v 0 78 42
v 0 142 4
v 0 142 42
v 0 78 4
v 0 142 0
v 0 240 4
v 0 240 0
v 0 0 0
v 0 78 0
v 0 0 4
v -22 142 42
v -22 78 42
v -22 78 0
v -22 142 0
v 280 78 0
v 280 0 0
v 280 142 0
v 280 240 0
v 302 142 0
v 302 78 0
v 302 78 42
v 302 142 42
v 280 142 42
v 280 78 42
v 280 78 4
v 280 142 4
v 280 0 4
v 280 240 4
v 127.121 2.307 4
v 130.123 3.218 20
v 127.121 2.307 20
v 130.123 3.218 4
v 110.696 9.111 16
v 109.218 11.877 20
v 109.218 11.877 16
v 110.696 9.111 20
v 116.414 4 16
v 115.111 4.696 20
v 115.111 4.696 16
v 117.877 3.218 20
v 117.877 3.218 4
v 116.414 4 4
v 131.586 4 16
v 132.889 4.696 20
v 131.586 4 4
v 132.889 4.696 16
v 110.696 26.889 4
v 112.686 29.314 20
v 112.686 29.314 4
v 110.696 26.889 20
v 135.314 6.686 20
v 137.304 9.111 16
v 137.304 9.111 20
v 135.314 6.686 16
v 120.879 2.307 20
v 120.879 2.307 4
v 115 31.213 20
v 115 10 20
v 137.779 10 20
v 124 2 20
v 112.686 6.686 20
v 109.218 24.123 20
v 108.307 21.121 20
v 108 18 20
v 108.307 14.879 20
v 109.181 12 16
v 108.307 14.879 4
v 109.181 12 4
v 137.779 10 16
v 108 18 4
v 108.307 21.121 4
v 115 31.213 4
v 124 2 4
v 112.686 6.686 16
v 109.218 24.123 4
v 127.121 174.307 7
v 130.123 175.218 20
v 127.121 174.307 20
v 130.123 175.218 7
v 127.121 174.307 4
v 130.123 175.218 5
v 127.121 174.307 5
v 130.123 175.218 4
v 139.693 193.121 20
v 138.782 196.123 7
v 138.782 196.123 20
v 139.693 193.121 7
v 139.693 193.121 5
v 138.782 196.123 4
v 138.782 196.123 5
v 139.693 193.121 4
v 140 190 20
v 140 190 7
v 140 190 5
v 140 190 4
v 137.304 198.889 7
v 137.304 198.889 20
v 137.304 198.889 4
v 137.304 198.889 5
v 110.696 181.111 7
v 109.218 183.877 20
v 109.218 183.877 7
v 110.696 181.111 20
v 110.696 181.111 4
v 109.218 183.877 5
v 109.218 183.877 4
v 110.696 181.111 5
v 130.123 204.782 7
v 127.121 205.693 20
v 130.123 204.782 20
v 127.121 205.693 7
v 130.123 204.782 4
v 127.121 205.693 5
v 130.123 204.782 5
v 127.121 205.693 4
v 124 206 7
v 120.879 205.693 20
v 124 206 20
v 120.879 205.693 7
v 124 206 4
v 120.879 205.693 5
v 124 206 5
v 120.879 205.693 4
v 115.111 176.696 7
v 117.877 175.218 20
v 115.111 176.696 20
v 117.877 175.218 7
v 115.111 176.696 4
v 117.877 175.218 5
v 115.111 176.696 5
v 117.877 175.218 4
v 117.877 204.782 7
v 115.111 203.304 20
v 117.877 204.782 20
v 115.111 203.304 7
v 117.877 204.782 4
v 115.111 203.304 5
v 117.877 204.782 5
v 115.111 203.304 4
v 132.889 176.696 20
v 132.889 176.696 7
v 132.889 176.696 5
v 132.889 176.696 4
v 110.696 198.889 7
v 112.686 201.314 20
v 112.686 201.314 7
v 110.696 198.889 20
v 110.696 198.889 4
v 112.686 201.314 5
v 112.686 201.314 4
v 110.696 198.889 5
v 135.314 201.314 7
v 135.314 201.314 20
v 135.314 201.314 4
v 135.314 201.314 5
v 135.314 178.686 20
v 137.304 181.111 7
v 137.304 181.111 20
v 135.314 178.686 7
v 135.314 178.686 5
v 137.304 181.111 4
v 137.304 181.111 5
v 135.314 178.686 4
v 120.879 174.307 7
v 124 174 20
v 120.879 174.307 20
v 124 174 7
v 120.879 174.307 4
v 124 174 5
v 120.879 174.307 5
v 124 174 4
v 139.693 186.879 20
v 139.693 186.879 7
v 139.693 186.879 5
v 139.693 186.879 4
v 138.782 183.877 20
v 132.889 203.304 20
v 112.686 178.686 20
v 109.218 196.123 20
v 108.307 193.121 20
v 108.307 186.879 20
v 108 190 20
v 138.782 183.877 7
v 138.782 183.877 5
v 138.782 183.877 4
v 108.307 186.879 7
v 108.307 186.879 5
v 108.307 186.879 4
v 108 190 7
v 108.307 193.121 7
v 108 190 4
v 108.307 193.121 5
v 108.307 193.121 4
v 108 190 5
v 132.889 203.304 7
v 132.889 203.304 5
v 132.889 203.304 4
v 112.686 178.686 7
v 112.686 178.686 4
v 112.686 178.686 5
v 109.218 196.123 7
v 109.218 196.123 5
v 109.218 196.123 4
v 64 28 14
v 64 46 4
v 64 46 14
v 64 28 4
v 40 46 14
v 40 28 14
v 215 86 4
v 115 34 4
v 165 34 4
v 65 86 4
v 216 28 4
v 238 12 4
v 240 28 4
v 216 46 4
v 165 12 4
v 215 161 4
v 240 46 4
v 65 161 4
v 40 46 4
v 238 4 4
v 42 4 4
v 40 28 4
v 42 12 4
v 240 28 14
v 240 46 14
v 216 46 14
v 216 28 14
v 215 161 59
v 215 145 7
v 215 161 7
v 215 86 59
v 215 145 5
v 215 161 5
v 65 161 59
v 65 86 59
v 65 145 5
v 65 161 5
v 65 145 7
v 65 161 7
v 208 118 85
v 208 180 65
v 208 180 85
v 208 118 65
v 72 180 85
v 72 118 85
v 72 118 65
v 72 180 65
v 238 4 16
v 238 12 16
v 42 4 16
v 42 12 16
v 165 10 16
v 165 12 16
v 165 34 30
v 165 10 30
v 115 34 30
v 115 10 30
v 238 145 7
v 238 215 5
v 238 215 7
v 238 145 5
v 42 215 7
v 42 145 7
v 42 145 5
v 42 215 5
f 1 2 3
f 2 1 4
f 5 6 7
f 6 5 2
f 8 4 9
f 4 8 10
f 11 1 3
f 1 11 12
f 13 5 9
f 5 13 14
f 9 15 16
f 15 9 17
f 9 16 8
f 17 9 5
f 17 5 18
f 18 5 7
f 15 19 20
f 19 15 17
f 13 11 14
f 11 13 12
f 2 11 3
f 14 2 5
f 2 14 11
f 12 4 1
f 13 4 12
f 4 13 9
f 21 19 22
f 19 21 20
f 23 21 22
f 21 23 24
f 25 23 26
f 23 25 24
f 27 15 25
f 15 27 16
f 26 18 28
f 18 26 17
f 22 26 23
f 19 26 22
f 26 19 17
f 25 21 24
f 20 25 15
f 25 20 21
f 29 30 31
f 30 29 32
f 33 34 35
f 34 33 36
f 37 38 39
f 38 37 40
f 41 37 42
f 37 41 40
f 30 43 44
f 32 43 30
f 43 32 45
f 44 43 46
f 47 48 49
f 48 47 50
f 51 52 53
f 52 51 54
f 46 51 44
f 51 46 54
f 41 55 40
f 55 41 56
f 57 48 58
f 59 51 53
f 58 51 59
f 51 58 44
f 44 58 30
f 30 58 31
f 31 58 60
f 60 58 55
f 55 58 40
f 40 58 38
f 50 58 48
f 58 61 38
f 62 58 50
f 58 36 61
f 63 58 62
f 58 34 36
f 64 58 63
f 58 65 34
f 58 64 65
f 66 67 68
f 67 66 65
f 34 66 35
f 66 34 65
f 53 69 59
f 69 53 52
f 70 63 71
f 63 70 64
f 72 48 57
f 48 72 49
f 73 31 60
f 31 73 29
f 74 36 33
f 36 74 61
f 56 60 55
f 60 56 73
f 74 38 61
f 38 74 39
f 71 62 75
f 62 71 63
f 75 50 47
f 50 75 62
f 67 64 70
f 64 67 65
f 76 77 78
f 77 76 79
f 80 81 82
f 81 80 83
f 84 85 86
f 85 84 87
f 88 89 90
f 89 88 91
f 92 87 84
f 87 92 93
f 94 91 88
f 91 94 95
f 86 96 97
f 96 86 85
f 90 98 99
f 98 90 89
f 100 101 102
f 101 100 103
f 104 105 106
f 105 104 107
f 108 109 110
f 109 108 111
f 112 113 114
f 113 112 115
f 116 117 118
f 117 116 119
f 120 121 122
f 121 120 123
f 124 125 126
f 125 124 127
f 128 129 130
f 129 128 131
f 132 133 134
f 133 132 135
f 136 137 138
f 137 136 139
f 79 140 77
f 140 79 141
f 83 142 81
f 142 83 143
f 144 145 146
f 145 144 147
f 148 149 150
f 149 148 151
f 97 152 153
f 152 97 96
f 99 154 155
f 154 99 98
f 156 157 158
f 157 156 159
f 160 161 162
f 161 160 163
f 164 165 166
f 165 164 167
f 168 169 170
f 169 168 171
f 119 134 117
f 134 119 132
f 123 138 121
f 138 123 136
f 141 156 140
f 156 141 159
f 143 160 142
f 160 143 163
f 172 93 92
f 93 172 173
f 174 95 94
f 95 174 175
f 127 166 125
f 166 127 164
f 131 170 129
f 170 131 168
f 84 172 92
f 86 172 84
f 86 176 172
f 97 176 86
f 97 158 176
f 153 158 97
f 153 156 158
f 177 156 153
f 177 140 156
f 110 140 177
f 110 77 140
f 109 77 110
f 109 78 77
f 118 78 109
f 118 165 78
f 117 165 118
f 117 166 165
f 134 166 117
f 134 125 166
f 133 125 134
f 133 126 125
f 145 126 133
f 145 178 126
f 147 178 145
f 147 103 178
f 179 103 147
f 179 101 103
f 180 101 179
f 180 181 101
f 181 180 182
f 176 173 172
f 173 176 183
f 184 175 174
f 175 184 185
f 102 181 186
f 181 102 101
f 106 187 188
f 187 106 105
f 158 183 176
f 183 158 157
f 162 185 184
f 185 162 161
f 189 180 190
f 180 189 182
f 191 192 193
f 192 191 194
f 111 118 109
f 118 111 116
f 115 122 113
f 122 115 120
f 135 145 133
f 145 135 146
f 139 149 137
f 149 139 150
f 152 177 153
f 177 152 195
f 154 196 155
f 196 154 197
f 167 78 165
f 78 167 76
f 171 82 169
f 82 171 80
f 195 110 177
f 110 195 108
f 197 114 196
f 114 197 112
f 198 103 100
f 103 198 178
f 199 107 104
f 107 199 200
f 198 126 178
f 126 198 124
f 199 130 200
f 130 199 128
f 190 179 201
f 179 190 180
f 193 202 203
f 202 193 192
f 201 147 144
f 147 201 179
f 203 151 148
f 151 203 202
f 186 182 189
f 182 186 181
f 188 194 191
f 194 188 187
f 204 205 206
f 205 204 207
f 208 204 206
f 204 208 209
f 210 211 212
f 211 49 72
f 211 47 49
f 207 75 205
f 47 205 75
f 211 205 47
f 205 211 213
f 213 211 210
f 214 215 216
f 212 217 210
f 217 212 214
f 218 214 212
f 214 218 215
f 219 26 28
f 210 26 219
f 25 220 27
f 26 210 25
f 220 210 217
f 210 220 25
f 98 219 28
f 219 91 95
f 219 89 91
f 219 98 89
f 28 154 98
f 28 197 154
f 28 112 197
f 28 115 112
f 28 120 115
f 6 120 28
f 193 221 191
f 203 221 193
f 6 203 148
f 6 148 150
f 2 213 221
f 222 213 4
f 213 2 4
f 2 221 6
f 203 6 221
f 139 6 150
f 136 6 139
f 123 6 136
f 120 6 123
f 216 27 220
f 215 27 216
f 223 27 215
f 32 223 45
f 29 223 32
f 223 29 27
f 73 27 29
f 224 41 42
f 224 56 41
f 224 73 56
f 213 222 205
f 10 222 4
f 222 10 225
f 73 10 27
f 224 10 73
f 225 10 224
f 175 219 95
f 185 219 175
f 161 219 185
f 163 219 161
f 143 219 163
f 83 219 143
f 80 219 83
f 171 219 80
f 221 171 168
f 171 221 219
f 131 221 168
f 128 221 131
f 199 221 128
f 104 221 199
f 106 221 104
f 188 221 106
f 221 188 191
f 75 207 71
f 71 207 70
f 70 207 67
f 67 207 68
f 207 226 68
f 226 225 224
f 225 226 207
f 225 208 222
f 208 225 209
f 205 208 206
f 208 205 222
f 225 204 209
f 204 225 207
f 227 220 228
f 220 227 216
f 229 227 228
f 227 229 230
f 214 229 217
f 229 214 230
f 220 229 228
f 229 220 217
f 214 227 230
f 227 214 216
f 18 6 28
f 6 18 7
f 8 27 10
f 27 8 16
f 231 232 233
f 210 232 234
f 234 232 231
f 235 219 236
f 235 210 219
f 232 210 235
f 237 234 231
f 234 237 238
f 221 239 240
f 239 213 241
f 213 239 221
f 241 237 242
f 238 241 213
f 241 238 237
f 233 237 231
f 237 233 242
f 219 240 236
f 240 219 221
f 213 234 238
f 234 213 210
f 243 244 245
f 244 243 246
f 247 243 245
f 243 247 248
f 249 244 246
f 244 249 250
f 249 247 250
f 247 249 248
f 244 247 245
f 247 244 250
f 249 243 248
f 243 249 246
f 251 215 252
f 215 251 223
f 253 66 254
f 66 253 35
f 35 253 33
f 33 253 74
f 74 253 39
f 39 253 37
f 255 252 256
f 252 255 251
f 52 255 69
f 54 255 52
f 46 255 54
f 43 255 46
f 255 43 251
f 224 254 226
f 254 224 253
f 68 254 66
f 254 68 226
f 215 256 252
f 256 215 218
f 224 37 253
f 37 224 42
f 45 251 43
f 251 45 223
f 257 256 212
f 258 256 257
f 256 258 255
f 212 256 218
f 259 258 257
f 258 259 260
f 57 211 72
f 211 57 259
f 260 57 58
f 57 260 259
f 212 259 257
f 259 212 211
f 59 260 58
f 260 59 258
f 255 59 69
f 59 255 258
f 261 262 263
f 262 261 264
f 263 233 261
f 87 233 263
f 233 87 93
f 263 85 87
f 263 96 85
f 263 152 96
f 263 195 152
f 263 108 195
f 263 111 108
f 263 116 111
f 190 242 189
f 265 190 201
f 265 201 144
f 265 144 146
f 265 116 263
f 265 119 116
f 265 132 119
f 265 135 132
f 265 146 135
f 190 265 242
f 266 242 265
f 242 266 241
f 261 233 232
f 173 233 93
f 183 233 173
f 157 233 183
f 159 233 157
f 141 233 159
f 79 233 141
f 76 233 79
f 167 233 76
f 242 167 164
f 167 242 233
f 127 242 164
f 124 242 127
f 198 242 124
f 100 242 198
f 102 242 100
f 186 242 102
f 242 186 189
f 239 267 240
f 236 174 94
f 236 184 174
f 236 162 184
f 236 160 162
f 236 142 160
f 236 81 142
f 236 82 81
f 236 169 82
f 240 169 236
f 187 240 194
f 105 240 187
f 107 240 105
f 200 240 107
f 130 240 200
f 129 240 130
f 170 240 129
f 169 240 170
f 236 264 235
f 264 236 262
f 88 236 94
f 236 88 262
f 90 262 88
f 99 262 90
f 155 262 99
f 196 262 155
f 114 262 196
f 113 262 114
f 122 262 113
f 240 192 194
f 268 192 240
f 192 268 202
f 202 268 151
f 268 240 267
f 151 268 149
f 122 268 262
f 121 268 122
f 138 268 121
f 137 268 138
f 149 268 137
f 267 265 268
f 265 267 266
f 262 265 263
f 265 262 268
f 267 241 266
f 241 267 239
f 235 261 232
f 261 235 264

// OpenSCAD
// Conceptual mopping robot footprint. Units mm. OpenSCAD model is a layout aid,
// not a fabrication-ready drawing: component footprints and fastener holes omitted.
$fn = 32;
chassis_w = 280;
chassis_d = 240;
plate_t = 4;
wheel_w = 22;
wheel_d = 64;
module box_at(x,y,z,sx,sy,sz) { translate([x,y,z]) cube([sx,sy,sz]); }
// Base plate
color("#94a3b8") box_at(0,0,0,chassis_w,chassis_d,plate_t);
// Drive wheels, left and right
color("#334155") {
  translate([-wheel_w,78,0]) cube([wheel_w,wheel_d,42]);
  translate([chassis_w,78,0]) cube([wheel_w,wheel_d,42]);
}
// Casters, front and rear (approximate envelopes)
color("#cbd5e1") {
  translate([chassis_w/2-16,18,0]) cylinder(h=20,r=16);
  translate([chassis_w/2-16,chassis_d-50,0]) cylinder(h=20,r=16);
}
// Tank and raised electronics deck represented as blocks
color("#38bdf8") box_at(65,86,plate_t,150,75,55);
color("#8b5cf6") box_at(72,118,65,136,62,20);
// Front sensor bracket, bumpers, down-facing cliff sensor footprints
color("#ef4444") box_at(42,4,plate_t,196,8,12);
color("#f59e0b") {
  box_at(40,28,plate_t,24,18,10);
  box_at(216,28,plate_t,24,18,10);
}
color("#2563eb") translate([chassis_w/2-25,10,plate_t]) cube([50,24,26]);
// Mop pad envelope on underside (displayed above base for clarity only)
color([0.2,0.8,0.4,0.55]) translate([42,145,plate_t+1]) cube([196,70,2]);
// Motor / wheel and tank fit should be checked against real hardware before fabrication.
